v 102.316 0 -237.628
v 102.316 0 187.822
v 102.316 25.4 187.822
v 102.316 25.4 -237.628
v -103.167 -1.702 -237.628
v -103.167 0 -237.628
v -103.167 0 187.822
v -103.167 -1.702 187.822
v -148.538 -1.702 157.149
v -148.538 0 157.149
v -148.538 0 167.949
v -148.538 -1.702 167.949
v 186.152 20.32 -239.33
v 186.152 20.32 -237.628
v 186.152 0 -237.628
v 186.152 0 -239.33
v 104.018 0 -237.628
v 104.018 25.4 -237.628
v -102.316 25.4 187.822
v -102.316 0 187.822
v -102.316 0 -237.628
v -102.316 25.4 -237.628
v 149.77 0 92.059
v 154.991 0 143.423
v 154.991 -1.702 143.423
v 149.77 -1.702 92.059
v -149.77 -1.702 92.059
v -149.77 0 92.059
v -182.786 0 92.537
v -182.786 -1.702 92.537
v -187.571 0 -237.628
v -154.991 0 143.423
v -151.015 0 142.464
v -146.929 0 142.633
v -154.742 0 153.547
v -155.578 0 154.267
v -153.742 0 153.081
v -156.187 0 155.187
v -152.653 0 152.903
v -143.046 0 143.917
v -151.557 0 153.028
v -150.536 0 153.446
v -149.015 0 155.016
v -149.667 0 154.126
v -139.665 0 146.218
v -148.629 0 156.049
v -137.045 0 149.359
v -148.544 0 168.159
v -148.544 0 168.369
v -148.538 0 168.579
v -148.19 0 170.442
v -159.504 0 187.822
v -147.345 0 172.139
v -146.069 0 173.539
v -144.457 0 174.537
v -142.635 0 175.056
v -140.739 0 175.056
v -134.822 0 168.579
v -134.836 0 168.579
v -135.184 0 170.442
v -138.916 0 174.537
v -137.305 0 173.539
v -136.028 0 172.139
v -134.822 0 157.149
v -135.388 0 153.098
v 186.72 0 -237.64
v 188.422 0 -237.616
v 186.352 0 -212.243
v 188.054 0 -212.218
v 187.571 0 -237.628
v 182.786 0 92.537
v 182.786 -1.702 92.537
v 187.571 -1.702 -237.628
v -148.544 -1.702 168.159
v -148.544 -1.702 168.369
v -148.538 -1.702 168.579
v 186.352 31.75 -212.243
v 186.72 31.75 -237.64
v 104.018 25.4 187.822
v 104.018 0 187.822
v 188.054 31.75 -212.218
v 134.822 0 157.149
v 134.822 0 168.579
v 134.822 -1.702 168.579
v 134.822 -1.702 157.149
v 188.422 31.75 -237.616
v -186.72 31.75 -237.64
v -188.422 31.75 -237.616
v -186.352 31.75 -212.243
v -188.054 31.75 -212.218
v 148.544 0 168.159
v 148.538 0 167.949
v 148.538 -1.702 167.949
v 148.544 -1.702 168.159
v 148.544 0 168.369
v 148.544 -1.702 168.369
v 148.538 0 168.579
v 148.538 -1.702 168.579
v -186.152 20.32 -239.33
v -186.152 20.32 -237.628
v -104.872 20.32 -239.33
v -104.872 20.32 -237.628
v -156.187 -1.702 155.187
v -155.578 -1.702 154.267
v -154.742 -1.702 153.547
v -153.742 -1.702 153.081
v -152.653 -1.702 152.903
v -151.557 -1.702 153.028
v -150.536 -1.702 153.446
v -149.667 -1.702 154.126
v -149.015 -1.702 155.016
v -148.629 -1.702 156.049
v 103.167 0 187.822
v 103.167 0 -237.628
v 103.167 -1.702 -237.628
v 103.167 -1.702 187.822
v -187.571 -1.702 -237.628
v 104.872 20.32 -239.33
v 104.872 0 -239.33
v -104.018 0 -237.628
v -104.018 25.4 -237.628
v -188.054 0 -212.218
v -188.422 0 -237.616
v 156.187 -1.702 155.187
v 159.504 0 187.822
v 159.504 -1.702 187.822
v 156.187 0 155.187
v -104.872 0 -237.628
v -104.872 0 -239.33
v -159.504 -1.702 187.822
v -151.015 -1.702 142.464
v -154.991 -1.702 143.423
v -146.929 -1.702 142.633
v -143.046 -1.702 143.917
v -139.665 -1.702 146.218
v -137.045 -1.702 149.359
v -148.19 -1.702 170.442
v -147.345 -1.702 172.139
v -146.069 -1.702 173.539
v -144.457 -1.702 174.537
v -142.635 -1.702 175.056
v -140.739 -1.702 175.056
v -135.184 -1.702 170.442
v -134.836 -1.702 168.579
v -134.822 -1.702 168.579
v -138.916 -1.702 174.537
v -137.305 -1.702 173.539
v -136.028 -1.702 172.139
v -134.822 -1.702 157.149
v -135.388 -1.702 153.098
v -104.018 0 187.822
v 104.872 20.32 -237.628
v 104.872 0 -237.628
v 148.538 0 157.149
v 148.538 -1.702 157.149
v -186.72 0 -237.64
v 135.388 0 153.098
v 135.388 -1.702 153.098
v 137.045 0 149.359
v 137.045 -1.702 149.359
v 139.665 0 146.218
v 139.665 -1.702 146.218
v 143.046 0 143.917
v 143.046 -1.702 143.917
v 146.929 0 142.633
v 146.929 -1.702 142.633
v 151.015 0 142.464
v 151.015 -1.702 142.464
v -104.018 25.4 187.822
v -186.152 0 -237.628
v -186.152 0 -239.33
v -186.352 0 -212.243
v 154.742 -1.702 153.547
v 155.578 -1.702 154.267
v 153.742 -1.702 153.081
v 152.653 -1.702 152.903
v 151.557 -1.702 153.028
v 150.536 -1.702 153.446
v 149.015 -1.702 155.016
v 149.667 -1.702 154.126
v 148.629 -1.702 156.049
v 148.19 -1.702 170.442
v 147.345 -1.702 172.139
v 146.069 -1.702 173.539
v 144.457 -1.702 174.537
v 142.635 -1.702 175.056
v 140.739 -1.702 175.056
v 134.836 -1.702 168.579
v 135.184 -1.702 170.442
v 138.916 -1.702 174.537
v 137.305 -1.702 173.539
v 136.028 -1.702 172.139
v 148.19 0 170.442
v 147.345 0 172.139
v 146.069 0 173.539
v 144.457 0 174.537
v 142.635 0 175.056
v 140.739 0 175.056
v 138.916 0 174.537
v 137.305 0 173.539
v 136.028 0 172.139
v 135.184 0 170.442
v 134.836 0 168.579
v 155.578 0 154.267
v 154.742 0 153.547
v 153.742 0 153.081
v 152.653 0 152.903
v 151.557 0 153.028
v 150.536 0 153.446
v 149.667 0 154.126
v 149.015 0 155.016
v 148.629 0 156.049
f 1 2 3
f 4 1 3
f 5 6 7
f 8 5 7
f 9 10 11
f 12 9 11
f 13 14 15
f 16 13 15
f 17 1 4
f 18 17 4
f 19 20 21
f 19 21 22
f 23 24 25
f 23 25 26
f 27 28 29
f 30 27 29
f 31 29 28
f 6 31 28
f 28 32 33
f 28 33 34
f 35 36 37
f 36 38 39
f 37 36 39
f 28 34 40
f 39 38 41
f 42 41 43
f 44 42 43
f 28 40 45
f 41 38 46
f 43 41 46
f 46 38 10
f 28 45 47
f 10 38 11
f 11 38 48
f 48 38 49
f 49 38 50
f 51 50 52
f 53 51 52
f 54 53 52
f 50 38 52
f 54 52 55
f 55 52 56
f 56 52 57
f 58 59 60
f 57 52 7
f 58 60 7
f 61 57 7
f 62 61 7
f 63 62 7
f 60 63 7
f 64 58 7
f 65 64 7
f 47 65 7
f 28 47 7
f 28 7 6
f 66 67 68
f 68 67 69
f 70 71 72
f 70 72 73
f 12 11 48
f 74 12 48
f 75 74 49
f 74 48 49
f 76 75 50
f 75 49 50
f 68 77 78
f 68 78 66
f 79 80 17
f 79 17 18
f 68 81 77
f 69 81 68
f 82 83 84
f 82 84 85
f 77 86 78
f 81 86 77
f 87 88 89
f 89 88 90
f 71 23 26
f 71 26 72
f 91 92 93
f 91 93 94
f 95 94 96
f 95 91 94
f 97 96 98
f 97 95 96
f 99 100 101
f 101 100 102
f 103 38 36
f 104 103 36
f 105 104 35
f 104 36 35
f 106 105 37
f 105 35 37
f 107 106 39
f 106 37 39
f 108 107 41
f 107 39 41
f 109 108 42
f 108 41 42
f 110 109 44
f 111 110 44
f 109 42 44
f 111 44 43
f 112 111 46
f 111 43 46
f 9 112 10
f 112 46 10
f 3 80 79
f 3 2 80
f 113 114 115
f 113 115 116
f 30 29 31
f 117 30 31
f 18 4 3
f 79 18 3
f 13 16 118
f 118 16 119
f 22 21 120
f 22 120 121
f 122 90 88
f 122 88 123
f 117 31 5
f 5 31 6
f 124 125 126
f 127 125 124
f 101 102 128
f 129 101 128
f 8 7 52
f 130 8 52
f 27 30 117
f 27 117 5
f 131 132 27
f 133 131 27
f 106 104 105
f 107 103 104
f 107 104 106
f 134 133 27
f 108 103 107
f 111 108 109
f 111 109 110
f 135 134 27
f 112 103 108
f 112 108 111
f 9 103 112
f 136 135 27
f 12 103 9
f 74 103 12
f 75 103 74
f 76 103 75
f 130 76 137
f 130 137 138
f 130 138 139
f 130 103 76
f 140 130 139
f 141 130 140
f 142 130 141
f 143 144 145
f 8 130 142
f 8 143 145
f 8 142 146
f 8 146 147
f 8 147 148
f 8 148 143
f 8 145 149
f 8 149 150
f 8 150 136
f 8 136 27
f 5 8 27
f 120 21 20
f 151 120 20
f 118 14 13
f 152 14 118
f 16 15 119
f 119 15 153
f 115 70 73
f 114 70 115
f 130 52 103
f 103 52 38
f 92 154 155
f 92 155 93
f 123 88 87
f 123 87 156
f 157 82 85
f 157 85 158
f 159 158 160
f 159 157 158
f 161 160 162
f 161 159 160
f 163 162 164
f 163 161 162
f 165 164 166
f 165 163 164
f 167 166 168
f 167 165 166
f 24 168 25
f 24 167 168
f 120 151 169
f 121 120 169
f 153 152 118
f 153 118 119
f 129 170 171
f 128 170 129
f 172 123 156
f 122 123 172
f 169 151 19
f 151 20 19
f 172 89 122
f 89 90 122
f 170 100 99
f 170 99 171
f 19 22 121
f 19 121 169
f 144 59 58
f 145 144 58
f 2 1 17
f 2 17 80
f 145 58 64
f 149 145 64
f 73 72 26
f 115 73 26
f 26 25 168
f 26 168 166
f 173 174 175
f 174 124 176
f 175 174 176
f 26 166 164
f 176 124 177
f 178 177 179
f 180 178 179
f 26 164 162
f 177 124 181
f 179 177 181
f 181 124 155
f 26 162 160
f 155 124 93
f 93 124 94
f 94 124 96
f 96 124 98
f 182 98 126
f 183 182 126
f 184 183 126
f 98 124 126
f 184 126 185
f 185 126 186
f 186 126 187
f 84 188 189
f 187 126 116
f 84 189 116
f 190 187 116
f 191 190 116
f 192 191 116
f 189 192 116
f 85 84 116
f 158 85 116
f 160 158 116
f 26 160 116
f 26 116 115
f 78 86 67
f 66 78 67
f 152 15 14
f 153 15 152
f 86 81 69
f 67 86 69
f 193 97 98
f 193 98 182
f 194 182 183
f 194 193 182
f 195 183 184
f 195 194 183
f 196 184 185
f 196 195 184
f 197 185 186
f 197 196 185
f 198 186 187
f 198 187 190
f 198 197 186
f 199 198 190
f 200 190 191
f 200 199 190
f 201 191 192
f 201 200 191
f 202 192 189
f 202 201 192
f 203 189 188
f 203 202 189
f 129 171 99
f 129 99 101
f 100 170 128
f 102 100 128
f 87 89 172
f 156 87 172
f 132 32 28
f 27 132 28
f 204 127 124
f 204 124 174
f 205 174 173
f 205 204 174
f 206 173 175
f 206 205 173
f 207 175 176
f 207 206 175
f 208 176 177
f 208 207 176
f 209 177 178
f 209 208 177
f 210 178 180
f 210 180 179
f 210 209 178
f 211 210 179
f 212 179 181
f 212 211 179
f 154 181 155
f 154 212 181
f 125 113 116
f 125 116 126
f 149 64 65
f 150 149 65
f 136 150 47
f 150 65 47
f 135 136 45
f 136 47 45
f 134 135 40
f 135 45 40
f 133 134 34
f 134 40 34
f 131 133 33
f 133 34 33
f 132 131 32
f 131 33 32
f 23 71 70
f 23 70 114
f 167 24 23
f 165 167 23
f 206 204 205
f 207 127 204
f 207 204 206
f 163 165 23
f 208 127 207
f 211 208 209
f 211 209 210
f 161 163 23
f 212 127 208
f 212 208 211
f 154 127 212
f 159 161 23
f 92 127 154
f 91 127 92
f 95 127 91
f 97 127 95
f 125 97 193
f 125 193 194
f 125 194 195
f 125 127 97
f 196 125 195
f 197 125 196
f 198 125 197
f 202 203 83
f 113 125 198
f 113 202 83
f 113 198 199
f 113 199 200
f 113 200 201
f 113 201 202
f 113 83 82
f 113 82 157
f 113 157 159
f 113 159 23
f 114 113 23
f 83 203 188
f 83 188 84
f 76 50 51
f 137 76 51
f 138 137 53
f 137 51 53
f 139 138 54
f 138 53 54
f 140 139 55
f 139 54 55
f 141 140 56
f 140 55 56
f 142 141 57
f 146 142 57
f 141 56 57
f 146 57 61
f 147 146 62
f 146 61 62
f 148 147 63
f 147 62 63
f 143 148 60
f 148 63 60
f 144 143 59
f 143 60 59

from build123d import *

# Parameters (mm, degrees)
F1_DEPTH = 1.7018
F2_W     = 25.4
F2_H     = 425.45
F3_DEPTH = 0.8509
F4_W     = 31.75
F4_H     = 25.4
F5_DEPTH = 0.8509
F6_W     = 81.28
F6_H     = 20.32
F7_DEPTH = 1.7018


with BuildPart() as f1:
    # F0 (on Front) → F1 (new body)
    with BuildSketch(Plane.XZ):
        with BuildLine():
            Line((-103.1669212267, 187.8218817012), (-159.5041212267, 187.8218817012))
            Line((-159.5041212267, 187.8218817012), (-156.1867401145, 155.187252012))
            ThreePointArc((-156.1867401145, 155.187252012), (-151.5571706541, 153.0283143942), (-148.5376311099, 157.1485456944))
            Line((-148.5376311099, 157.1485456944), (-148.5376311099, 167.949217708))
            ThreePointArc((-148.5376311099, 167.949217708), (-148.54485374, 168.2638817012), (-148.5376311099, 168.5785456944))
            ThreePointArc((-148.5376311099, 168.5785456944), (-141.68685374, 175.1218817012), (-134.8360763702, 168.5785456944))
            Line((-134.8360763702, 168.5785456944), (-134.8216311099, 168.5785456944))
            Line((-134.8216311099, 168.5785456944), (-134.8216311099, 157.1485456944))
            ThreePointArc((-134.8216311099, 157.1485456944), (-141.2752918314, 144.9501853795), (-154.9908311102, 143.4225357558))
            Line((-154.9908311102, 143.4225357558), (-149.7695864082, 92.058709411))
            Line((-149.7695864082, 92.058709411), (-182.7861191995, 92.5372096138))
            Line((-182.7861191995, 92.5372096138), (-187.5711212267, -237.6281182988))
            Line((-187.5711212267, -237.6281182988), (-103.1669212267, -237.6281182988))
            Line((-103.1669212267, -237.6281182988), (-103.1669212267, 187.8218817012))
        make_face()
    extrude(amount=F1_DEPTH)


with BuildPart() as f3:
    # F2 (on face) → F3 (new body, symmetric)
    with BuildSketch(Plane.YZ.offset(-103.1669212267)):
        with Locations((12.7, -24.9031182988)):
            Rectangle(F2_W, F2_H)
    extrude(amount=F3_DEPTH, both=True)


with BuildPart() as f5:
    # F4 (on face) → F5 (new body, symmetric)
    with BuildSketch(Plane(origin=(-184.0885715131, 0, 2.6679487923), x_dir=(0, -1, 0), z_dir=(-0.9998949967, 0, 0.0144912236))):
        with Locations((-15.875, -227.6213016192)):
            Rectangle(F4_W, F4_H)
    extrude(amount=F5_DEPTH, both=True)


with BuildPart() as f7:
    # F6 (on face) → F7 (new body)
    with BuildSketch(Plane(origin=(0, 0, -237.6281182988), x_dir=(1, 0, 0), z_dir=(0, 0, -1))):
        with Locations((-145.5118919468, -10.16)):
            Rectangle(F6_W, F6_H)
    extrude(amount=F7_DEPTH)


with BuildPart() as f8_1:
    # F8: instance of F1
    add(f1.part.mirror(Plane.YZ))


with BuildPart() as f8_2:
    # F8: instance of F3
    add(f3.part.mirror(Plane.YZ))


with BuildPart() as f8_3:
    # F8: instance of F5
    add(f5.part.mirror(Plane.YZ))


with BuildPart() as f8_4:
    # F8: instance of F7
    add(f7.part.mirror(Plane.YZ))


solid = Compound([f1.part, f3.part, f5.part, f7.part, f8_1.part, f8_2.part, f8_3.part, f8_4.part])
